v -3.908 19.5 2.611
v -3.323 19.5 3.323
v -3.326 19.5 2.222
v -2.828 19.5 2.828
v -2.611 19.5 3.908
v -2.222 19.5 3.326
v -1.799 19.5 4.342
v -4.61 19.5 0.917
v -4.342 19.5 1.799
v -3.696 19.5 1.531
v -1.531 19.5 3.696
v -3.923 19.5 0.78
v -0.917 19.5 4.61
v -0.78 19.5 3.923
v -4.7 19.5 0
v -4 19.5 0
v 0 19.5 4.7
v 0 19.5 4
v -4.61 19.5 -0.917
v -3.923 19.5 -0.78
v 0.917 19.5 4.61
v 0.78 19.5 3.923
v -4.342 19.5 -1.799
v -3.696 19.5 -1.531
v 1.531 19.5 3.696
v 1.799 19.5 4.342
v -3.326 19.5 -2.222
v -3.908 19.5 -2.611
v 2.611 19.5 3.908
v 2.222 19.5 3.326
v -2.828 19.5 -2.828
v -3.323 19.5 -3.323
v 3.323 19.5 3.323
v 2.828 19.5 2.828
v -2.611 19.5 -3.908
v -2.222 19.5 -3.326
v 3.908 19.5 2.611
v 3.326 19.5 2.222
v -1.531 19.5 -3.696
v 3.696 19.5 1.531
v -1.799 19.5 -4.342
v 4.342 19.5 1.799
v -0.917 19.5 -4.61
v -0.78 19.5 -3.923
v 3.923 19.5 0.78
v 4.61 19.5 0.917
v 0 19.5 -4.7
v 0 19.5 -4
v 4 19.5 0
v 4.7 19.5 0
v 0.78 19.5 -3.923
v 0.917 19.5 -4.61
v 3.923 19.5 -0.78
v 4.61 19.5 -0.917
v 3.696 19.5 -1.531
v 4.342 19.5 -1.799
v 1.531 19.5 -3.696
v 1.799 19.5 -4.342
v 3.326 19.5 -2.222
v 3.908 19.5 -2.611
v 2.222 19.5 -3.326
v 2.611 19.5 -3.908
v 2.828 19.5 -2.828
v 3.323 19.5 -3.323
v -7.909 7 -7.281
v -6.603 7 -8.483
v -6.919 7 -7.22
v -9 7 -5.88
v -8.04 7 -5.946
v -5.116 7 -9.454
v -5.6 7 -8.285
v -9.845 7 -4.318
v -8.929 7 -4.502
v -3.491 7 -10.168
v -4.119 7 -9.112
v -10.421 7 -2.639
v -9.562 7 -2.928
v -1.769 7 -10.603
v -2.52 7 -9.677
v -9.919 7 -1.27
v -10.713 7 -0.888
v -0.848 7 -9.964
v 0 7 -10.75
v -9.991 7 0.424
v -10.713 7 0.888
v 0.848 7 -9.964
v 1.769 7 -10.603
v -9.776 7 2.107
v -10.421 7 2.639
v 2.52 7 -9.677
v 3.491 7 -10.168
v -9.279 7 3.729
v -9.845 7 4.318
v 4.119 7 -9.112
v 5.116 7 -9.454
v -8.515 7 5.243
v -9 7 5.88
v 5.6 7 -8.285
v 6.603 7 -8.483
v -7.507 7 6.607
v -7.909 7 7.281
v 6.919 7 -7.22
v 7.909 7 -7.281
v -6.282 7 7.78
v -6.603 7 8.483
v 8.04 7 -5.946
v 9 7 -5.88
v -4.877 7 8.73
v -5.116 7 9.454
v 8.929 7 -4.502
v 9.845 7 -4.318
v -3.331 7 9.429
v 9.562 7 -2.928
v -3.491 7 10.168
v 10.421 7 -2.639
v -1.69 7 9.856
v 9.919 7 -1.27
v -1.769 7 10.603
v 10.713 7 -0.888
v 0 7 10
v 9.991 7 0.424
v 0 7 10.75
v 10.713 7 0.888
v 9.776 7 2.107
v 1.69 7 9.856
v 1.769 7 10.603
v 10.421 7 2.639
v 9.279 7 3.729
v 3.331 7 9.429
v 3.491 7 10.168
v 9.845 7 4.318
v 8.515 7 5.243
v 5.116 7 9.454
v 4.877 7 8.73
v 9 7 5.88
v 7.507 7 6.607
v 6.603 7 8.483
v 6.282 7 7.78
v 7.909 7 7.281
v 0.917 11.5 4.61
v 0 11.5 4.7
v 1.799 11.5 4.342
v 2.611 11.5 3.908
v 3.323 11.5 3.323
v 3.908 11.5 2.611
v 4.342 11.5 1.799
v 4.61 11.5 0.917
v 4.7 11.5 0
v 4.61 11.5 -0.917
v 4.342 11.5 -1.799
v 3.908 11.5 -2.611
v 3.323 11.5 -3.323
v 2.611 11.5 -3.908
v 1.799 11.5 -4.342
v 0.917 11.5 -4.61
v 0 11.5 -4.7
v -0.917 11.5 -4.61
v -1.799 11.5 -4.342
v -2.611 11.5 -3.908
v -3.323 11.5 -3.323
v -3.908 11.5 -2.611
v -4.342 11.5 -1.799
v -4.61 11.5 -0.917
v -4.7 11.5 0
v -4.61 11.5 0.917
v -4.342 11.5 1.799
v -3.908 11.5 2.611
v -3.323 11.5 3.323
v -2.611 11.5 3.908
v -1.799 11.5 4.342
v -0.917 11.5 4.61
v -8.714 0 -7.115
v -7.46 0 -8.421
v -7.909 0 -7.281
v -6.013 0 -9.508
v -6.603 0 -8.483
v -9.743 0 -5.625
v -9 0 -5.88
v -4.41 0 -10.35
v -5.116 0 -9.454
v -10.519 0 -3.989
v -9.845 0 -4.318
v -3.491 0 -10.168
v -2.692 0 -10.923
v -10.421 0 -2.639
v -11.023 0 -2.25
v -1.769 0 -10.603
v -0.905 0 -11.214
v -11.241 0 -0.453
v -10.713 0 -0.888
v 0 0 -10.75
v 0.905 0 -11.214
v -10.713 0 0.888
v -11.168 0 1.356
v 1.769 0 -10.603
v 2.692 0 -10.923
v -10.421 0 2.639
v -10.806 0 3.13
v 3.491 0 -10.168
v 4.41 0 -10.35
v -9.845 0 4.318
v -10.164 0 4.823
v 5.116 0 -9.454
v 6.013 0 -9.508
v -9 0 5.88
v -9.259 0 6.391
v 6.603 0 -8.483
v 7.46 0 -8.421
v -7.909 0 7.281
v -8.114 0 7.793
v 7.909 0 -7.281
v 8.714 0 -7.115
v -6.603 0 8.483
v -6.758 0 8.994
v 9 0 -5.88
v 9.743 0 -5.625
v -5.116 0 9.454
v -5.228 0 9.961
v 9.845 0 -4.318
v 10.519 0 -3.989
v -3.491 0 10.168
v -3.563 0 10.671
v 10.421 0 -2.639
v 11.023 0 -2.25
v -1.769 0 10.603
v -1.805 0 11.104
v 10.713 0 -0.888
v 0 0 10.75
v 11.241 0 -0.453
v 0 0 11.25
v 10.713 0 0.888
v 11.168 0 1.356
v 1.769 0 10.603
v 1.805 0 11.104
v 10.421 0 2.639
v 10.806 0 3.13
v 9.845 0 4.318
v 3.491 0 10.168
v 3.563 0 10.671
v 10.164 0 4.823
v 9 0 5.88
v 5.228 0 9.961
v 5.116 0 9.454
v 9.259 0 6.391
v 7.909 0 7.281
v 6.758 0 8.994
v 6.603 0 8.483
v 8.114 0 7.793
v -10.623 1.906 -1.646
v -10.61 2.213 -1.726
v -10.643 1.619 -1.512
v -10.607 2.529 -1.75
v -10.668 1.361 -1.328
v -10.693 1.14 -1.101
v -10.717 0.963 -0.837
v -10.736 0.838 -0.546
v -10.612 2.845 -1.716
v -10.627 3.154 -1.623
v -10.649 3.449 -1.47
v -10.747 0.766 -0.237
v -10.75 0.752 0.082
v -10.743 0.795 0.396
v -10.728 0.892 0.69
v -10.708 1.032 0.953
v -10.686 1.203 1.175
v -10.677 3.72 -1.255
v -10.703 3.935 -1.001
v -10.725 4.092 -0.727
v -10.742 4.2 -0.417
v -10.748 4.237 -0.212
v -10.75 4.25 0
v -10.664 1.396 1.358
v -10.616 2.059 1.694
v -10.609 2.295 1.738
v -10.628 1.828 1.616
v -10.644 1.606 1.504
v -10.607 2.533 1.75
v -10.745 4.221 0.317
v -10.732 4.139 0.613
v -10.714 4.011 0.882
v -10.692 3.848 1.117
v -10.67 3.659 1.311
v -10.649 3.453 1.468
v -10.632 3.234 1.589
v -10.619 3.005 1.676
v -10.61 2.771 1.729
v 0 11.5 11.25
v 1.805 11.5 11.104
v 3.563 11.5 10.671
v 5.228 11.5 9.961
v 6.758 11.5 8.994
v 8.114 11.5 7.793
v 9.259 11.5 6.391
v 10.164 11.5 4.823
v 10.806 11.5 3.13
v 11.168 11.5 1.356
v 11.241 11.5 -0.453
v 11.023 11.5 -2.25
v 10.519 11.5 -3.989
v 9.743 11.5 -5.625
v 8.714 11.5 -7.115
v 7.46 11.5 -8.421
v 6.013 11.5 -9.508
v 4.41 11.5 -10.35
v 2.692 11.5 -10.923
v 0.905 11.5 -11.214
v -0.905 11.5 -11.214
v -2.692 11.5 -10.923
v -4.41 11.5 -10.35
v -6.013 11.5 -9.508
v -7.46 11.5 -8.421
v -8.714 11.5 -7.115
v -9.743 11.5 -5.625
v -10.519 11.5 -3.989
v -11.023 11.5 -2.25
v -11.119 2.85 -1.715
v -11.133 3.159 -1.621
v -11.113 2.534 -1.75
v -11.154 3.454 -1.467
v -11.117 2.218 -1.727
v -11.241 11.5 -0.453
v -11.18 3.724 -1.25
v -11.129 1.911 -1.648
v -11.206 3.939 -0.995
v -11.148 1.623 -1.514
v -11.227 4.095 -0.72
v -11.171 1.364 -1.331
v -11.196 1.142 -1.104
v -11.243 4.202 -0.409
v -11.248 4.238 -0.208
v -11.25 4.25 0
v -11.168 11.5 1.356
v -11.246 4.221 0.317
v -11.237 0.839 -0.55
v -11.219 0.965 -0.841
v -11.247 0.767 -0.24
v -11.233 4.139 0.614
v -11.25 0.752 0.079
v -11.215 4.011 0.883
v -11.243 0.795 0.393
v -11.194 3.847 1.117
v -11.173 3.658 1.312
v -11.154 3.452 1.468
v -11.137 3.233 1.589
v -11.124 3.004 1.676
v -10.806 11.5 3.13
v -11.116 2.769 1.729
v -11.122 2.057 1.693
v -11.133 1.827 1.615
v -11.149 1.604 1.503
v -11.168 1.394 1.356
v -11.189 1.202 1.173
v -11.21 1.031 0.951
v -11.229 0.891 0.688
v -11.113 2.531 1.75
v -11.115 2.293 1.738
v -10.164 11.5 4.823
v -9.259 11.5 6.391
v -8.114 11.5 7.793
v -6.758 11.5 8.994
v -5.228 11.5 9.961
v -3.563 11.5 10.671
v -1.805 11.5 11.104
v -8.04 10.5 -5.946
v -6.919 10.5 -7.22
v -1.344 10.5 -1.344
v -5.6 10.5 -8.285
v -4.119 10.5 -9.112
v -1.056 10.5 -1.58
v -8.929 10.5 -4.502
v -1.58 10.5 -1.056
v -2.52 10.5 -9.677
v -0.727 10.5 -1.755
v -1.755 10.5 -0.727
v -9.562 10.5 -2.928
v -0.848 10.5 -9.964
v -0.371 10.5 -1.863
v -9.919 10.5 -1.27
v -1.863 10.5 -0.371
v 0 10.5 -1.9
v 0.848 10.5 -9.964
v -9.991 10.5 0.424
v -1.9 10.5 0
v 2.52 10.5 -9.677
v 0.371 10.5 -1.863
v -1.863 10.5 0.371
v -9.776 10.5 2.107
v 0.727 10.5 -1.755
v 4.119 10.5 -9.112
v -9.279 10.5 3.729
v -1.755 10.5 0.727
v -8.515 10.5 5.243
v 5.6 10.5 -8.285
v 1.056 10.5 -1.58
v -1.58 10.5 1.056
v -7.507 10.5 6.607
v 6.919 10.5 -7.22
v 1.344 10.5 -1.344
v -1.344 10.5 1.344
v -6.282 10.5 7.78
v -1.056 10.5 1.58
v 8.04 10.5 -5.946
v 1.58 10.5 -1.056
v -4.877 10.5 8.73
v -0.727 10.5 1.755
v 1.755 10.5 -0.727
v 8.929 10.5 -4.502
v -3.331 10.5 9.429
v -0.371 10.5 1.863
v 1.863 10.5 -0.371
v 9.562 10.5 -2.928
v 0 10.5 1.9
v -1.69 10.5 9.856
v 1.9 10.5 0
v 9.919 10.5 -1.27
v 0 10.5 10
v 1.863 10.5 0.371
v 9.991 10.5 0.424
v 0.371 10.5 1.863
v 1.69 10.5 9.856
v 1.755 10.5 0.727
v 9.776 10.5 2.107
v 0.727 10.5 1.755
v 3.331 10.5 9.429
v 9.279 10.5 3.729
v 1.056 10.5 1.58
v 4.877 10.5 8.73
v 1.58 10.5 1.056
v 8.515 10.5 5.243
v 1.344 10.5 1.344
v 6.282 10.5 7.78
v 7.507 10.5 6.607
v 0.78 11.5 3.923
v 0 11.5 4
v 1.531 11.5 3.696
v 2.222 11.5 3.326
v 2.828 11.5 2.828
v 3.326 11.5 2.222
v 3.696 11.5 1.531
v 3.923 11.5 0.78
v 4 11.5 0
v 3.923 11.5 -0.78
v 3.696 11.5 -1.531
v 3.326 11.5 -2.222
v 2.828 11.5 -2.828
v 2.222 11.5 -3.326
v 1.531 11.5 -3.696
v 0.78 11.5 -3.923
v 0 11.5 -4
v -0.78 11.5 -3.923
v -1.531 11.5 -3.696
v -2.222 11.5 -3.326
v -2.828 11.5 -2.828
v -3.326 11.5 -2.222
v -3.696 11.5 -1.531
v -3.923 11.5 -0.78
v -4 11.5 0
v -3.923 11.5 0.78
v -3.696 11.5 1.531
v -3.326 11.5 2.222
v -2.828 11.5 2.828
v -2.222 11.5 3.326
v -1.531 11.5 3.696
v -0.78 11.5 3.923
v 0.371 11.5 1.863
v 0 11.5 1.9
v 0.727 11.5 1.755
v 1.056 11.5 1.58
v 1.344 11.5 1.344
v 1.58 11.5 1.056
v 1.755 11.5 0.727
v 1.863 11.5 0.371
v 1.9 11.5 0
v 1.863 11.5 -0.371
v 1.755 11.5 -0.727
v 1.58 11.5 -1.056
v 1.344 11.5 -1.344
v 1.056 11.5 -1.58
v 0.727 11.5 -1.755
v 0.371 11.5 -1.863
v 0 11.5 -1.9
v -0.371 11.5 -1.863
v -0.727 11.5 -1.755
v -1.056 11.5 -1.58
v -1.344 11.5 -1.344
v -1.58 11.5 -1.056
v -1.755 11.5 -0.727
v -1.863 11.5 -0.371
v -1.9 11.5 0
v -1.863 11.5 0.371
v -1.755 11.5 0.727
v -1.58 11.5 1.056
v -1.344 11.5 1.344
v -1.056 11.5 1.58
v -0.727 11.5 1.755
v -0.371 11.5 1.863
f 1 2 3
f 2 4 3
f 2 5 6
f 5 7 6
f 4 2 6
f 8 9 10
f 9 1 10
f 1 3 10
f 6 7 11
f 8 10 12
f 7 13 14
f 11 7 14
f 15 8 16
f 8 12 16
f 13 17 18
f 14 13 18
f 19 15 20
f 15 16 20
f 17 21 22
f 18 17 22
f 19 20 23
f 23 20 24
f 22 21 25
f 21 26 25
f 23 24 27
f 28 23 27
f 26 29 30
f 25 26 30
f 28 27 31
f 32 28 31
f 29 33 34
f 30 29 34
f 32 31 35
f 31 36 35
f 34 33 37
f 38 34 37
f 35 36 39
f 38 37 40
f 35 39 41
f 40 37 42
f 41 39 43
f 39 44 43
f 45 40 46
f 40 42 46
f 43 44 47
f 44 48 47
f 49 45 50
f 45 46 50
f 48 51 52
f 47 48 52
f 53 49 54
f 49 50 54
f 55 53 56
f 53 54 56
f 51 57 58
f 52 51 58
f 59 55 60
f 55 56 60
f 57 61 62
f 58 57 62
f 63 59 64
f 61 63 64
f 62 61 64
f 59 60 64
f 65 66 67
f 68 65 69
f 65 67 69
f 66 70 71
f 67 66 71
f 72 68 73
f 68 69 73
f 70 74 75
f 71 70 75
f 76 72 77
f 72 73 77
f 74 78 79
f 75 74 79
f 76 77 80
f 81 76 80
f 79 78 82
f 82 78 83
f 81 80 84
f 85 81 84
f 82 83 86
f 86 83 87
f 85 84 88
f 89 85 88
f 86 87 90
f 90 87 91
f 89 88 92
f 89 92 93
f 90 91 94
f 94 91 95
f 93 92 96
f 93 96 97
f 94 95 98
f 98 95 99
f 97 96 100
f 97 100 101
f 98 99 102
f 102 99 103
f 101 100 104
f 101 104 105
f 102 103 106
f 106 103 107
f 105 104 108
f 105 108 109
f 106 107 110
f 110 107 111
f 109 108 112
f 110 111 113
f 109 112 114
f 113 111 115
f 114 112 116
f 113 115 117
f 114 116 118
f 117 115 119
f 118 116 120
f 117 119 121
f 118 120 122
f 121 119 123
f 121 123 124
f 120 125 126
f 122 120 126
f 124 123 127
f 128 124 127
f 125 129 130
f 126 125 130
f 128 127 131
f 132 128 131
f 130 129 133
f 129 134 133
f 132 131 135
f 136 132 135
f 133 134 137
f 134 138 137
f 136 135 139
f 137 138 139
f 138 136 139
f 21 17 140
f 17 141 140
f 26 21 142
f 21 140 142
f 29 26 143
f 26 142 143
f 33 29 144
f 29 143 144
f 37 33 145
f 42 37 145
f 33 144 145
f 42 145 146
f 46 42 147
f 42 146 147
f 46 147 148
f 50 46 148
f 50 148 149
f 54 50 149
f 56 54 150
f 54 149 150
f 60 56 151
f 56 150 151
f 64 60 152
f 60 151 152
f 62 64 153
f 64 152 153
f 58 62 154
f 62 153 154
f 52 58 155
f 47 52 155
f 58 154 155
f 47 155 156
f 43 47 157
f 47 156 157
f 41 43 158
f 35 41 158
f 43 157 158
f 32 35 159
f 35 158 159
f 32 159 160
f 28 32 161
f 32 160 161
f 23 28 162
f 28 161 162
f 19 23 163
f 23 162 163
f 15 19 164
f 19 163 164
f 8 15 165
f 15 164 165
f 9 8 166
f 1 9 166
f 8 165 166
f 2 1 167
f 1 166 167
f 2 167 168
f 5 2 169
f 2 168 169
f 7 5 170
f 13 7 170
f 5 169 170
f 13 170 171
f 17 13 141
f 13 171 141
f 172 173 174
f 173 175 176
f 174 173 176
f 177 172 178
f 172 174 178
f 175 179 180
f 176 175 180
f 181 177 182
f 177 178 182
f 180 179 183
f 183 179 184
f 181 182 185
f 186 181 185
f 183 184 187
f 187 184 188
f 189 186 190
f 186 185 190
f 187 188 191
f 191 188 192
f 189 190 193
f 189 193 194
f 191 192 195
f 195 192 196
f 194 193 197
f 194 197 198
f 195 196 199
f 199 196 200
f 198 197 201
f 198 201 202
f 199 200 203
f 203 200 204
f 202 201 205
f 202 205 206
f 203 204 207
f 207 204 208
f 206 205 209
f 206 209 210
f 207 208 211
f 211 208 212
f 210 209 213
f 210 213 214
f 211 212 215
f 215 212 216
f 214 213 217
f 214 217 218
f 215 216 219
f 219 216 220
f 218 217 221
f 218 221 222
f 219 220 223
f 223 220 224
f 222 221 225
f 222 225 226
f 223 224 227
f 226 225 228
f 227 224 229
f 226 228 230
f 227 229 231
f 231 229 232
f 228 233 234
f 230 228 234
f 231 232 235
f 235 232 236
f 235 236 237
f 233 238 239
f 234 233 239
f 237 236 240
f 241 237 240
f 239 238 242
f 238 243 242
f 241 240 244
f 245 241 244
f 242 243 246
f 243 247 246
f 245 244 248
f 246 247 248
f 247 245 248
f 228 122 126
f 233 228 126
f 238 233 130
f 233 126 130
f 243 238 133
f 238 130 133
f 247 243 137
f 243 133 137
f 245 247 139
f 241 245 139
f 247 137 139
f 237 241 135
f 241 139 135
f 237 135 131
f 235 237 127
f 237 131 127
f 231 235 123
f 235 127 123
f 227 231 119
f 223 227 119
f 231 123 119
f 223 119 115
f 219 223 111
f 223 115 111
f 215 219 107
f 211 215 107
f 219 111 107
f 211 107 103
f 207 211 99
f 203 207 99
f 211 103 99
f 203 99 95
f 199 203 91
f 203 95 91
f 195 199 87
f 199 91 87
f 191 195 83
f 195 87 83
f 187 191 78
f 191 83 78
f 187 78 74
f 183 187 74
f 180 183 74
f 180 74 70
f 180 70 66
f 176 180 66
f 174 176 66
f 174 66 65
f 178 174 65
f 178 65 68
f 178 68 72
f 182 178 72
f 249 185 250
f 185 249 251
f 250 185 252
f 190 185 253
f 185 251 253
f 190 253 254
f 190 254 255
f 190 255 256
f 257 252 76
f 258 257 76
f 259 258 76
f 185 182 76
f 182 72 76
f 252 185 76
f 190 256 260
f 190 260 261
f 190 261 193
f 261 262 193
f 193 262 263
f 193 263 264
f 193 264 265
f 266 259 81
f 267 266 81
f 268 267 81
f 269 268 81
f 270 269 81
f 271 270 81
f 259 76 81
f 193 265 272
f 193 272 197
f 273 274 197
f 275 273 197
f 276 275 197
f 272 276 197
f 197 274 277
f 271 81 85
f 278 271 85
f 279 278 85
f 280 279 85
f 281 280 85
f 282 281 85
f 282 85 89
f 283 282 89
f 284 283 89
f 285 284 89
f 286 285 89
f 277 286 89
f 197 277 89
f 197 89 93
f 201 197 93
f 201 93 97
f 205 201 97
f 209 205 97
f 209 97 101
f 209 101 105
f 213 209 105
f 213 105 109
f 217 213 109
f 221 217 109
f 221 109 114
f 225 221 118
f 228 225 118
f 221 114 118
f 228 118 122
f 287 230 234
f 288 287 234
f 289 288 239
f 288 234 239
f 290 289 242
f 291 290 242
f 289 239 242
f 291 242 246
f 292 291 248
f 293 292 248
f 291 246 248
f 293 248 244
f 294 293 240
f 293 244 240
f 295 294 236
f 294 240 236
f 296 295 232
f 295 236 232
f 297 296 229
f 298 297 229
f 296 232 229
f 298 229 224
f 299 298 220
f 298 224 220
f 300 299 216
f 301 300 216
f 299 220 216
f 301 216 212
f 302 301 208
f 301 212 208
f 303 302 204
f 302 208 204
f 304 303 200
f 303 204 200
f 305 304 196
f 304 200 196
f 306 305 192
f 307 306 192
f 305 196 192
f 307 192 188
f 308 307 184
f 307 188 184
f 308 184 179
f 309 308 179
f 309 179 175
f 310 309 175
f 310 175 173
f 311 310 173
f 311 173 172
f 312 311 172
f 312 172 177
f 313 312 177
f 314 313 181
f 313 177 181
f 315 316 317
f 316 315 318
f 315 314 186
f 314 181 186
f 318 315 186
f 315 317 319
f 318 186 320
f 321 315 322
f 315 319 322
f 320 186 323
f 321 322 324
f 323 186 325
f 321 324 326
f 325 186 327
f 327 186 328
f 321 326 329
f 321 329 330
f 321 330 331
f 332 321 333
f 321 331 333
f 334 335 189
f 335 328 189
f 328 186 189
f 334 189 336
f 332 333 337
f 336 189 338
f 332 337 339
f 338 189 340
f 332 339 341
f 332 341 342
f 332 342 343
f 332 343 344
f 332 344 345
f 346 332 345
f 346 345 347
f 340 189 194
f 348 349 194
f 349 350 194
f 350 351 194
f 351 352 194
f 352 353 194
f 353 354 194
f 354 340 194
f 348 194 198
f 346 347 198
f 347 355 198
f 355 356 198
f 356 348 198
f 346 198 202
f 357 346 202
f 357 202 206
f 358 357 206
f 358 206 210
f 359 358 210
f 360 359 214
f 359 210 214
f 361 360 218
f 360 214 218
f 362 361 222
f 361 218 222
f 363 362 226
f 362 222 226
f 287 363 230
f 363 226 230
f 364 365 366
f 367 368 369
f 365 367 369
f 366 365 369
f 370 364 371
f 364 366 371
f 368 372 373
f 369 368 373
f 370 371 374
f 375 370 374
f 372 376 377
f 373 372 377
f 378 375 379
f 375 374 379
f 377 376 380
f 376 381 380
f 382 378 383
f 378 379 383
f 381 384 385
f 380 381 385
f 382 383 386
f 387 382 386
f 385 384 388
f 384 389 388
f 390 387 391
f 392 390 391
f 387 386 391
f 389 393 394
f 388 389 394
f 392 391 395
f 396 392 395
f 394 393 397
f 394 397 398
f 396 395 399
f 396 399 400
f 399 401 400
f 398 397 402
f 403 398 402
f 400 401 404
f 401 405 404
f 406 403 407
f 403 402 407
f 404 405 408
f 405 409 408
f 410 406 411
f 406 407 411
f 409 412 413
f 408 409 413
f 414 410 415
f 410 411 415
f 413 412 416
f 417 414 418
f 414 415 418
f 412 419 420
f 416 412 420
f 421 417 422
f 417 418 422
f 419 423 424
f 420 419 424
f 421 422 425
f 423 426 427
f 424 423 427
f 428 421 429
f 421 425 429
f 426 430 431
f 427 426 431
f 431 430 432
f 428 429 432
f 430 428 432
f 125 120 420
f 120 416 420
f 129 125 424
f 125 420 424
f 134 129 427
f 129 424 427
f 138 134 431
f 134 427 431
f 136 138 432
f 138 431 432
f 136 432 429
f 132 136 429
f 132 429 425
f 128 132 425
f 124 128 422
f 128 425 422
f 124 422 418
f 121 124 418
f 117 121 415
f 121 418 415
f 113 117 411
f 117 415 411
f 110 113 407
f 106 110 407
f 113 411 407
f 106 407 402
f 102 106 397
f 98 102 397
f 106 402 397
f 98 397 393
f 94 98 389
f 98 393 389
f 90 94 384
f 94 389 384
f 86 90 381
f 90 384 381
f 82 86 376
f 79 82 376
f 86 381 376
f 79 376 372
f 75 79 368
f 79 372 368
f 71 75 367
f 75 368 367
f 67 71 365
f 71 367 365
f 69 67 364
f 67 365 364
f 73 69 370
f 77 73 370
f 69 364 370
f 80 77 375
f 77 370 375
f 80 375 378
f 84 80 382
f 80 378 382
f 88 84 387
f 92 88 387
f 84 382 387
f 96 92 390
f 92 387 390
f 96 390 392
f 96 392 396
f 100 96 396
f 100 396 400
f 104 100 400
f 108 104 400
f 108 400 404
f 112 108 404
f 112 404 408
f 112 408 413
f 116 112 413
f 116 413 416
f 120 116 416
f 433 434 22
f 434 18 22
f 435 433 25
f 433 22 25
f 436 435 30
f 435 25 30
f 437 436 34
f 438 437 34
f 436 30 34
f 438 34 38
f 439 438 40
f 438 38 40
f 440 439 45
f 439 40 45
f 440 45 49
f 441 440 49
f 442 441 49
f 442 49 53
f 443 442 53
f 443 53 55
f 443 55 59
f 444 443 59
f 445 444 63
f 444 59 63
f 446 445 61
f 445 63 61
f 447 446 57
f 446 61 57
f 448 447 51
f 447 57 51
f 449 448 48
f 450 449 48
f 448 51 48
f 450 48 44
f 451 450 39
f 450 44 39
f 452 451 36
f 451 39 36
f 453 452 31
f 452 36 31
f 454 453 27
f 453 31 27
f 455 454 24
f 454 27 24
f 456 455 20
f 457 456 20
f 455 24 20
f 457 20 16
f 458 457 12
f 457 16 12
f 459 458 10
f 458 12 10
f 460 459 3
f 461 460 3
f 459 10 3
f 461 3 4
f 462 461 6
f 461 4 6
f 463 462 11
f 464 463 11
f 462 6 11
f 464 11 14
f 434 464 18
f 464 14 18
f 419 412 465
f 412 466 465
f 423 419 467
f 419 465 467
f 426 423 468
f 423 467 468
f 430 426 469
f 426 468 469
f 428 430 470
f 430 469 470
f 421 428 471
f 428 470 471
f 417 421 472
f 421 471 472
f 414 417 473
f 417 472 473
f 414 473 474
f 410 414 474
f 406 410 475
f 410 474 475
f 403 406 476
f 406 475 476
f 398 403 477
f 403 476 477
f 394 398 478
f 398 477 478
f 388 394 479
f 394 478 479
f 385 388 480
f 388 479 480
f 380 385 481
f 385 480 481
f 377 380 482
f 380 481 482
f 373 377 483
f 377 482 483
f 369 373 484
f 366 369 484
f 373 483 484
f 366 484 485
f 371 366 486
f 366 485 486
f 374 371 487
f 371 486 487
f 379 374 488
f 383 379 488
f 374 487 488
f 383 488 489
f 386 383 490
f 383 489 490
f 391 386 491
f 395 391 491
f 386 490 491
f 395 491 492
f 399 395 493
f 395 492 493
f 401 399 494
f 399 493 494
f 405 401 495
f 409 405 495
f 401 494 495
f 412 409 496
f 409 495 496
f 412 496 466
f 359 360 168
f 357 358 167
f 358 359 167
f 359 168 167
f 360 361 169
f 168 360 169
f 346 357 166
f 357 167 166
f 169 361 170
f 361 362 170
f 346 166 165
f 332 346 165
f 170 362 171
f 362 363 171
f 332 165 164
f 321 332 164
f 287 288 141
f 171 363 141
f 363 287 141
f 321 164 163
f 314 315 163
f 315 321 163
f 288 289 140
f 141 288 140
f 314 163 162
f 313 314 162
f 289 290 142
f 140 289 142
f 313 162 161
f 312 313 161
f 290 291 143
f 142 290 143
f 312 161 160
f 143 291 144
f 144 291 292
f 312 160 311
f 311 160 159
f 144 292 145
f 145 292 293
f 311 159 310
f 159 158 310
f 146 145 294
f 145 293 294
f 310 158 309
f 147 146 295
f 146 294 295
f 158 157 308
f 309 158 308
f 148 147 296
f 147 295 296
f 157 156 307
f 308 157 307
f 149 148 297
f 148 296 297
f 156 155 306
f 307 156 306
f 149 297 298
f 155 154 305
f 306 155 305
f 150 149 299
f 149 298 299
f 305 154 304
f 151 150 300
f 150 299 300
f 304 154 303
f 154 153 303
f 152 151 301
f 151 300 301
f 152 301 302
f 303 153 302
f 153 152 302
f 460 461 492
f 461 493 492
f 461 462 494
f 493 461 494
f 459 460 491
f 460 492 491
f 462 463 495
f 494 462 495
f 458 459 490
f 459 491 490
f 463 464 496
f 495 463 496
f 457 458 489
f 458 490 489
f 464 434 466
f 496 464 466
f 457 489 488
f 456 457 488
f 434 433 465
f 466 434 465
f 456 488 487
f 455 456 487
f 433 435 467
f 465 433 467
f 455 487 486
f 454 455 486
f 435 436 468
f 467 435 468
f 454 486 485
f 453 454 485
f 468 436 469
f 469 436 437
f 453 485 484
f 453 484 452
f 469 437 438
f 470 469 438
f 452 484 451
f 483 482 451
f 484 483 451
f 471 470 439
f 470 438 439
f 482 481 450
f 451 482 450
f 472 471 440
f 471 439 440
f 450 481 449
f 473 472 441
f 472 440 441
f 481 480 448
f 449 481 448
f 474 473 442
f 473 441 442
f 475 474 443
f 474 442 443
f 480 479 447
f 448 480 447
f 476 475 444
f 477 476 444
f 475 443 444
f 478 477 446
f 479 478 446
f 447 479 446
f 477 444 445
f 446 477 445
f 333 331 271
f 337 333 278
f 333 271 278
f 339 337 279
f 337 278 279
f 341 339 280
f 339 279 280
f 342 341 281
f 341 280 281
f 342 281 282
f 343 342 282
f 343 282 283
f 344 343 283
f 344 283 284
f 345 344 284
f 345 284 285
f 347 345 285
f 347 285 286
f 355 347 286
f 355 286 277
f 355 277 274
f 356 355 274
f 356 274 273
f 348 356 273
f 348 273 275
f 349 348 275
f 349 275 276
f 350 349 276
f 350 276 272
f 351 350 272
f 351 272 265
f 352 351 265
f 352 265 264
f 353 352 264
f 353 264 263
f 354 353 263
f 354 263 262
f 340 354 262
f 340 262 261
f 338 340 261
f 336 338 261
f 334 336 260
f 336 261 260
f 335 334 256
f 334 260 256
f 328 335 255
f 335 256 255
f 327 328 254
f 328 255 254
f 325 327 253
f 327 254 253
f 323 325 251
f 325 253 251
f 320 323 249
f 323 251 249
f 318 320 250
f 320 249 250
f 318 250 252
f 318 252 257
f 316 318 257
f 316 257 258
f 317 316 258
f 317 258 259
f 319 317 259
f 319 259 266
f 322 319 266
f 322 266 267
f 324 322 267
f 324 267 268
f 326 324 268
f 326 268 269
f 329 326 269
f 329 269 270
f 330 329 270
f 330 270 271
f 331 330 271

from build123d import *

# Parameters (mm, degrees)
F2_R     = 1.75
F3_DEPTH = 11.251


with BuildPart() as f1:
    # F0 (on Right) → F1 (revolve)
    with BuildSketch(Plane.YZ):
        Polygon((11.5, 11.25), (0, 11.25), (0, 10.75), (7, 10.75), (7, 10), (10.5, 10), (10.5, 1.9), (11.5, 1.9), (11.5, 4), (19.5, 4), (19.5, 4.7), (11.5, 4.7), align=None)
    revolve(axis=Axis((0, 13.454885, 0), (0, 1, 0)))

    # F2 (on Right) → F3 (cut, through all)
    with BuildSketch(Plane.YZ):
        with Locations((2.5, 0)):
            Circle(F2_R)
    extrude(amount=-F3_DEPTH, mode=Mode.SUBTRACT)


solid = f1.part
